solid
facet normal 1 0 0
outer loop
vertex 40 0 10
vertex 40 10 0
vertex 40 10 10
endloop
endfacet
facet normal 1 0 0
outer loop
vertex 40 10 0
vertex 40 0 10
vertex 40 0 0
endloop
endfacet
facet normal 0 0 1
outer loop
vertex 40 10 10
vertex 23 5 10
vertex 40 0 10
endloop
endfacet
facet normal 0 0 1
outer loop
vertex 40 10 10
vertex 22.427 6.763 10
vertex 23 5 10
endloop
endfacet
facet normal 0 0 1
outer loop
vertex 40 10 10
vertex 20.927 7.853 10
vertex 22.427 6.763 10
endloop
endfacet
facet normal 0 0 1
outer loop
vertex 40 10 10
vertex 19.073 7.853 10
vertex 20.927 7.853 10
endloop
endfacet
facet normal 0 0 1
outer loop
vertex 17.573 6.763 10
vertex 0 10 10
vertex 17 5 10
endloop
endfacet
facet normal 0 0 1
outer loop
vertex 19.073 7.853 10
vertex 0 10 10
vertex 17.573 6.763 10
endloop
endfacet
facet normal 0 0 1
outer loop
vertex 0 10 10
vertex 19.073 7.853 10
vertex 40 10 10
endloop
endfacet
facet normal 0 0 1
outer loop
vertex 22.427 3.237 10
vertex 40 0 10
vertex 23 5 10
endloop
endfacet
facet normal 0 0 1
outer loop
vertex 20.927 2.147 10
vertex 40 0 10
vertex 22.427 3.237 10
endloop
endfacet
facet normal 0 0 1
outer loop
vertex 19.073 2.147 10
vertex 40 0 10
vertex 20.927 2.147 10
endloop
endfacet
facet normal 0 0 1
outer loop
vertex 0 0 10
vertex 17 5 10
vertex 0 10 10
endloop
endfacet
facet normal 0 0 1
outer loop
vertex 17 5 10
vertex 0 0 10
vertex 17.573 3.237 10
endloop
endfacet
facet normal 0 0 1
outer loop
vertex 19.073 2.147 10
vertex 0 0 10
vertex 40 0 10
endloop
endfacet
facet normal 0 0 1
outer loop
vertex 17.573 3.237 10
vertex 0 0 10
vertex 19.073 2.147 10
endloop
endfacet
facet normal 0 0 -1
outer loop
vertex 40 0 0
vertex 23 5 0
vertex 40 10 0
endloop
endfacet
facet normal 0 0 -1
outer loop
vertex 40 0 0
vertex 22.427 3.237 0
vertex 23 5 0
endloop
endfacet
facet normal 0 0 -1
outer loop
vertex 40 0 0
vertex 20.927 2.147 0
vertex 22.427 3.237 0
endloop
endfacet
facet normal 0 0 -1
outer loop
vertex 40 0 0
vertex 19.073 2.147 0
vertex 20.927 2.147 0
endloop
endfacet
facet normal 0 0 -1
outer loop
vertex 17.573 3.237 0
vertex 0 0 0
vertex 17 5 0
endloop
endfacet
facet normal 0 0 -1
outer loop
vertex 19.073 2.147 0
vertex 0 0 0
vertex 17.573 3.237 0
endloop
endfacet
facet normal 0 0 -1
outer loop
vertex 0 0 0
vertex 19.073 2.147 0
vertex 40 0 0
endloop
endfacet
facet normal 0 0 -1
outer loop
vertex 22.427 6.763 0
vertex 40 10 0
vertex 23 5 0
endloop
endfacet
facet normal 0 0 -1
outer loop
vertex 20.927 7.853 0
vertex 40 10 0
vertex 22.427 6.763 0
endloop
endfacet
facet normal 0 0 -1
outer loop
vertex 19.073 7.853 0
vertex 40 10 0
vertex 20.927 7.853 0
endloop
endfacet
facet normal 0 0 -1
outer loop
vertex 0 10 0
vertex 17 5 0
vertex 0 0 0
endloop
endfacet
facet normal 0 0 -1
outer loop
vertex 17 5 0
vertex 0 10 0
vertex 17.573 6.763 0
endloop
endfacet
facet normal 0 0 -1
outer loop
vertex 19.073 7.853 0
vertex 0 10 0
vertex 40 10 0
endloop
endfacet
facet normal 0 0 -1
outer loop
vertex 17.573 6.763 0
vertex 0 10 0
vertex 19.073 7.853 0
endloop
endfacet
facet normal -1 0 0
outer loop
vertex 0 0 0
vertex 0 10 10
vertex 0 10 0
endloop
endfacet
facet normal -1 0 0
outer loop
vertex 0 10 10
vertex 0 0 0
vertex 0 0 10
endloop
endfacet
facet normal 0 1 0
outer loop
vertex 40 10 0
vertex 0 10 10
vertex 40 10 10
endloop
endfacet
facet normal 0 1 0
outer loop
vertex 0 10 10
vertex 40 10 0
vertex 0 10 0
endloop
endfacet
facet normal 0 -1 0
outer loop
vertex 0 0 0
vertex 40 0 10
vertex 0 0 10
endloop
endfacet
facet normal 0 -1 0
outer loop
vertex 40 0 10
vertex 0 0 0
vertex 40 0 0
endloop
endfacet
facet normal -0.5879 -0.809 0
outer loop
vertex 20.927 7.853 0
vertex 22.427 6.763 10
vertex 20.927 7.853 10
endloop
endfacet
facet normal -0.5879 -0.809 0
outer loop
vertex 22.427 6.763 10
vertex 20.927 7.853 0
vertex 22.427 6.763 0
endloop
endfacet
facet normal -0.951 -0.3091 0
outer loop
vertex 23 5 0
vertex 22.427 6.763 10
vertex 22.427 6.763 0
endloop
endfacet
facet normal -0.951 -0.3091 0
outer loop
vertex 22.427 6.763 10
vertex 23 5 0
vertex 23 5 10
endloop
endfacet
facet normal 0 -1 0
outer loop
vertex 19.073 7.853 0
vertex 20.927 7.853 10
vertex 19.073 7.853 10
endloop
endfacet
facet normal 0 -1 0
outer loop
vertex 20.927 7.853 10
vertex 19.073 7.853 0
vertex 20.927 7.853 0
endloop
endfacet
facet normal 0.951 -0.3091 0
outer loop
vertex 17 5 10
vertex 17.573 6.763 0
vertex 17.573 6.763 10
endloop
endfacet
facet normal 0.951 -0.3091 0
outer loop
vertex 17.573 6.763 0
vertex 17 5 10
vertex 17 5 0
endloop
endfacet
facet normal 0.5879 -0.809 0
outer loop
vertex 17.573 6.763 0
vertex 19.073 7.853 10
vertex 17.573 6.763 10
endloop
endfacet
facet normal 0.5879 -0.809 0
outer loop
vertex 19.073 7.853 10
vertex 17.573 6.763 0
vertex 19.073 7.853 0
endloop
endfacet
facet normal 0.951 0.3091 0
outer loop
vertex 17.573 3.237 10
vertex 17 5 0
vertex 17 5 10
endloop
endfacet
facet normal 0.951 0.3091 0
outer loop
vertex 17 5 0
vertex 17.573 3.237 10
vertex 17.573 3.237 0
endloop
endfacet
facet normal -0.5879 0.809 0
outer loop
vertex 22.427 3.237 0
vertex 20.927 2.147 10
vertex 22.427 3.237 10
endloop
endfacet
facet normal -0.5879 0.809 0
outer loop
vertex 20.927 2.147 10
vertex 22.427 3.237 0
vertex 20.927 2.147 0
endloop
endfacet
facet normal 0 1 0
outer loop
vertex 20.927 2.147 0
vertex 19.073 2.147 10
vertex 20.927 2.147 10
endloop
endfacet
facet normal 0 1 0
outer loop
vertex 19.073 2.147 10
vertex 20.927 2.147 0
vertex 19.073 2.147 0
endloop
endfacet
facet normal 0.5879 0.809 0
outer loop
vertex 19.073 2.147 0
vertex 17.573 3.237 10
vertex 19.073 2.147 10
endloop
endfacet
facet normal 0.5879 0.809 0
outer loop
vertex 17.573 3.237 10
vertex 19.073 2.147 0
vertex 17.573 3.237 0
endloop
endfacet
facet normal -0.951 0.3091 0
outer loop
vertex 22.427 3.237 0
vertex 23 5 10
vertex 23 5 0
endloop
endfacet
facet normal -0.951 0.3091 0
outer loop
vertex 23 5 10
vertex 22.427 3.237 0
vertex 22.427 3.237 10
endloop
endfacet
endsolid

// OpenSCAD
// Example parametric model (for reference)
width = 40;
height = 10;
hole_radius = 3;

difference() {
    cube([width, height, 10]);

    translate([width/2, height/2, 0])
        cylinder(h=10, r=hole_radius);
}
